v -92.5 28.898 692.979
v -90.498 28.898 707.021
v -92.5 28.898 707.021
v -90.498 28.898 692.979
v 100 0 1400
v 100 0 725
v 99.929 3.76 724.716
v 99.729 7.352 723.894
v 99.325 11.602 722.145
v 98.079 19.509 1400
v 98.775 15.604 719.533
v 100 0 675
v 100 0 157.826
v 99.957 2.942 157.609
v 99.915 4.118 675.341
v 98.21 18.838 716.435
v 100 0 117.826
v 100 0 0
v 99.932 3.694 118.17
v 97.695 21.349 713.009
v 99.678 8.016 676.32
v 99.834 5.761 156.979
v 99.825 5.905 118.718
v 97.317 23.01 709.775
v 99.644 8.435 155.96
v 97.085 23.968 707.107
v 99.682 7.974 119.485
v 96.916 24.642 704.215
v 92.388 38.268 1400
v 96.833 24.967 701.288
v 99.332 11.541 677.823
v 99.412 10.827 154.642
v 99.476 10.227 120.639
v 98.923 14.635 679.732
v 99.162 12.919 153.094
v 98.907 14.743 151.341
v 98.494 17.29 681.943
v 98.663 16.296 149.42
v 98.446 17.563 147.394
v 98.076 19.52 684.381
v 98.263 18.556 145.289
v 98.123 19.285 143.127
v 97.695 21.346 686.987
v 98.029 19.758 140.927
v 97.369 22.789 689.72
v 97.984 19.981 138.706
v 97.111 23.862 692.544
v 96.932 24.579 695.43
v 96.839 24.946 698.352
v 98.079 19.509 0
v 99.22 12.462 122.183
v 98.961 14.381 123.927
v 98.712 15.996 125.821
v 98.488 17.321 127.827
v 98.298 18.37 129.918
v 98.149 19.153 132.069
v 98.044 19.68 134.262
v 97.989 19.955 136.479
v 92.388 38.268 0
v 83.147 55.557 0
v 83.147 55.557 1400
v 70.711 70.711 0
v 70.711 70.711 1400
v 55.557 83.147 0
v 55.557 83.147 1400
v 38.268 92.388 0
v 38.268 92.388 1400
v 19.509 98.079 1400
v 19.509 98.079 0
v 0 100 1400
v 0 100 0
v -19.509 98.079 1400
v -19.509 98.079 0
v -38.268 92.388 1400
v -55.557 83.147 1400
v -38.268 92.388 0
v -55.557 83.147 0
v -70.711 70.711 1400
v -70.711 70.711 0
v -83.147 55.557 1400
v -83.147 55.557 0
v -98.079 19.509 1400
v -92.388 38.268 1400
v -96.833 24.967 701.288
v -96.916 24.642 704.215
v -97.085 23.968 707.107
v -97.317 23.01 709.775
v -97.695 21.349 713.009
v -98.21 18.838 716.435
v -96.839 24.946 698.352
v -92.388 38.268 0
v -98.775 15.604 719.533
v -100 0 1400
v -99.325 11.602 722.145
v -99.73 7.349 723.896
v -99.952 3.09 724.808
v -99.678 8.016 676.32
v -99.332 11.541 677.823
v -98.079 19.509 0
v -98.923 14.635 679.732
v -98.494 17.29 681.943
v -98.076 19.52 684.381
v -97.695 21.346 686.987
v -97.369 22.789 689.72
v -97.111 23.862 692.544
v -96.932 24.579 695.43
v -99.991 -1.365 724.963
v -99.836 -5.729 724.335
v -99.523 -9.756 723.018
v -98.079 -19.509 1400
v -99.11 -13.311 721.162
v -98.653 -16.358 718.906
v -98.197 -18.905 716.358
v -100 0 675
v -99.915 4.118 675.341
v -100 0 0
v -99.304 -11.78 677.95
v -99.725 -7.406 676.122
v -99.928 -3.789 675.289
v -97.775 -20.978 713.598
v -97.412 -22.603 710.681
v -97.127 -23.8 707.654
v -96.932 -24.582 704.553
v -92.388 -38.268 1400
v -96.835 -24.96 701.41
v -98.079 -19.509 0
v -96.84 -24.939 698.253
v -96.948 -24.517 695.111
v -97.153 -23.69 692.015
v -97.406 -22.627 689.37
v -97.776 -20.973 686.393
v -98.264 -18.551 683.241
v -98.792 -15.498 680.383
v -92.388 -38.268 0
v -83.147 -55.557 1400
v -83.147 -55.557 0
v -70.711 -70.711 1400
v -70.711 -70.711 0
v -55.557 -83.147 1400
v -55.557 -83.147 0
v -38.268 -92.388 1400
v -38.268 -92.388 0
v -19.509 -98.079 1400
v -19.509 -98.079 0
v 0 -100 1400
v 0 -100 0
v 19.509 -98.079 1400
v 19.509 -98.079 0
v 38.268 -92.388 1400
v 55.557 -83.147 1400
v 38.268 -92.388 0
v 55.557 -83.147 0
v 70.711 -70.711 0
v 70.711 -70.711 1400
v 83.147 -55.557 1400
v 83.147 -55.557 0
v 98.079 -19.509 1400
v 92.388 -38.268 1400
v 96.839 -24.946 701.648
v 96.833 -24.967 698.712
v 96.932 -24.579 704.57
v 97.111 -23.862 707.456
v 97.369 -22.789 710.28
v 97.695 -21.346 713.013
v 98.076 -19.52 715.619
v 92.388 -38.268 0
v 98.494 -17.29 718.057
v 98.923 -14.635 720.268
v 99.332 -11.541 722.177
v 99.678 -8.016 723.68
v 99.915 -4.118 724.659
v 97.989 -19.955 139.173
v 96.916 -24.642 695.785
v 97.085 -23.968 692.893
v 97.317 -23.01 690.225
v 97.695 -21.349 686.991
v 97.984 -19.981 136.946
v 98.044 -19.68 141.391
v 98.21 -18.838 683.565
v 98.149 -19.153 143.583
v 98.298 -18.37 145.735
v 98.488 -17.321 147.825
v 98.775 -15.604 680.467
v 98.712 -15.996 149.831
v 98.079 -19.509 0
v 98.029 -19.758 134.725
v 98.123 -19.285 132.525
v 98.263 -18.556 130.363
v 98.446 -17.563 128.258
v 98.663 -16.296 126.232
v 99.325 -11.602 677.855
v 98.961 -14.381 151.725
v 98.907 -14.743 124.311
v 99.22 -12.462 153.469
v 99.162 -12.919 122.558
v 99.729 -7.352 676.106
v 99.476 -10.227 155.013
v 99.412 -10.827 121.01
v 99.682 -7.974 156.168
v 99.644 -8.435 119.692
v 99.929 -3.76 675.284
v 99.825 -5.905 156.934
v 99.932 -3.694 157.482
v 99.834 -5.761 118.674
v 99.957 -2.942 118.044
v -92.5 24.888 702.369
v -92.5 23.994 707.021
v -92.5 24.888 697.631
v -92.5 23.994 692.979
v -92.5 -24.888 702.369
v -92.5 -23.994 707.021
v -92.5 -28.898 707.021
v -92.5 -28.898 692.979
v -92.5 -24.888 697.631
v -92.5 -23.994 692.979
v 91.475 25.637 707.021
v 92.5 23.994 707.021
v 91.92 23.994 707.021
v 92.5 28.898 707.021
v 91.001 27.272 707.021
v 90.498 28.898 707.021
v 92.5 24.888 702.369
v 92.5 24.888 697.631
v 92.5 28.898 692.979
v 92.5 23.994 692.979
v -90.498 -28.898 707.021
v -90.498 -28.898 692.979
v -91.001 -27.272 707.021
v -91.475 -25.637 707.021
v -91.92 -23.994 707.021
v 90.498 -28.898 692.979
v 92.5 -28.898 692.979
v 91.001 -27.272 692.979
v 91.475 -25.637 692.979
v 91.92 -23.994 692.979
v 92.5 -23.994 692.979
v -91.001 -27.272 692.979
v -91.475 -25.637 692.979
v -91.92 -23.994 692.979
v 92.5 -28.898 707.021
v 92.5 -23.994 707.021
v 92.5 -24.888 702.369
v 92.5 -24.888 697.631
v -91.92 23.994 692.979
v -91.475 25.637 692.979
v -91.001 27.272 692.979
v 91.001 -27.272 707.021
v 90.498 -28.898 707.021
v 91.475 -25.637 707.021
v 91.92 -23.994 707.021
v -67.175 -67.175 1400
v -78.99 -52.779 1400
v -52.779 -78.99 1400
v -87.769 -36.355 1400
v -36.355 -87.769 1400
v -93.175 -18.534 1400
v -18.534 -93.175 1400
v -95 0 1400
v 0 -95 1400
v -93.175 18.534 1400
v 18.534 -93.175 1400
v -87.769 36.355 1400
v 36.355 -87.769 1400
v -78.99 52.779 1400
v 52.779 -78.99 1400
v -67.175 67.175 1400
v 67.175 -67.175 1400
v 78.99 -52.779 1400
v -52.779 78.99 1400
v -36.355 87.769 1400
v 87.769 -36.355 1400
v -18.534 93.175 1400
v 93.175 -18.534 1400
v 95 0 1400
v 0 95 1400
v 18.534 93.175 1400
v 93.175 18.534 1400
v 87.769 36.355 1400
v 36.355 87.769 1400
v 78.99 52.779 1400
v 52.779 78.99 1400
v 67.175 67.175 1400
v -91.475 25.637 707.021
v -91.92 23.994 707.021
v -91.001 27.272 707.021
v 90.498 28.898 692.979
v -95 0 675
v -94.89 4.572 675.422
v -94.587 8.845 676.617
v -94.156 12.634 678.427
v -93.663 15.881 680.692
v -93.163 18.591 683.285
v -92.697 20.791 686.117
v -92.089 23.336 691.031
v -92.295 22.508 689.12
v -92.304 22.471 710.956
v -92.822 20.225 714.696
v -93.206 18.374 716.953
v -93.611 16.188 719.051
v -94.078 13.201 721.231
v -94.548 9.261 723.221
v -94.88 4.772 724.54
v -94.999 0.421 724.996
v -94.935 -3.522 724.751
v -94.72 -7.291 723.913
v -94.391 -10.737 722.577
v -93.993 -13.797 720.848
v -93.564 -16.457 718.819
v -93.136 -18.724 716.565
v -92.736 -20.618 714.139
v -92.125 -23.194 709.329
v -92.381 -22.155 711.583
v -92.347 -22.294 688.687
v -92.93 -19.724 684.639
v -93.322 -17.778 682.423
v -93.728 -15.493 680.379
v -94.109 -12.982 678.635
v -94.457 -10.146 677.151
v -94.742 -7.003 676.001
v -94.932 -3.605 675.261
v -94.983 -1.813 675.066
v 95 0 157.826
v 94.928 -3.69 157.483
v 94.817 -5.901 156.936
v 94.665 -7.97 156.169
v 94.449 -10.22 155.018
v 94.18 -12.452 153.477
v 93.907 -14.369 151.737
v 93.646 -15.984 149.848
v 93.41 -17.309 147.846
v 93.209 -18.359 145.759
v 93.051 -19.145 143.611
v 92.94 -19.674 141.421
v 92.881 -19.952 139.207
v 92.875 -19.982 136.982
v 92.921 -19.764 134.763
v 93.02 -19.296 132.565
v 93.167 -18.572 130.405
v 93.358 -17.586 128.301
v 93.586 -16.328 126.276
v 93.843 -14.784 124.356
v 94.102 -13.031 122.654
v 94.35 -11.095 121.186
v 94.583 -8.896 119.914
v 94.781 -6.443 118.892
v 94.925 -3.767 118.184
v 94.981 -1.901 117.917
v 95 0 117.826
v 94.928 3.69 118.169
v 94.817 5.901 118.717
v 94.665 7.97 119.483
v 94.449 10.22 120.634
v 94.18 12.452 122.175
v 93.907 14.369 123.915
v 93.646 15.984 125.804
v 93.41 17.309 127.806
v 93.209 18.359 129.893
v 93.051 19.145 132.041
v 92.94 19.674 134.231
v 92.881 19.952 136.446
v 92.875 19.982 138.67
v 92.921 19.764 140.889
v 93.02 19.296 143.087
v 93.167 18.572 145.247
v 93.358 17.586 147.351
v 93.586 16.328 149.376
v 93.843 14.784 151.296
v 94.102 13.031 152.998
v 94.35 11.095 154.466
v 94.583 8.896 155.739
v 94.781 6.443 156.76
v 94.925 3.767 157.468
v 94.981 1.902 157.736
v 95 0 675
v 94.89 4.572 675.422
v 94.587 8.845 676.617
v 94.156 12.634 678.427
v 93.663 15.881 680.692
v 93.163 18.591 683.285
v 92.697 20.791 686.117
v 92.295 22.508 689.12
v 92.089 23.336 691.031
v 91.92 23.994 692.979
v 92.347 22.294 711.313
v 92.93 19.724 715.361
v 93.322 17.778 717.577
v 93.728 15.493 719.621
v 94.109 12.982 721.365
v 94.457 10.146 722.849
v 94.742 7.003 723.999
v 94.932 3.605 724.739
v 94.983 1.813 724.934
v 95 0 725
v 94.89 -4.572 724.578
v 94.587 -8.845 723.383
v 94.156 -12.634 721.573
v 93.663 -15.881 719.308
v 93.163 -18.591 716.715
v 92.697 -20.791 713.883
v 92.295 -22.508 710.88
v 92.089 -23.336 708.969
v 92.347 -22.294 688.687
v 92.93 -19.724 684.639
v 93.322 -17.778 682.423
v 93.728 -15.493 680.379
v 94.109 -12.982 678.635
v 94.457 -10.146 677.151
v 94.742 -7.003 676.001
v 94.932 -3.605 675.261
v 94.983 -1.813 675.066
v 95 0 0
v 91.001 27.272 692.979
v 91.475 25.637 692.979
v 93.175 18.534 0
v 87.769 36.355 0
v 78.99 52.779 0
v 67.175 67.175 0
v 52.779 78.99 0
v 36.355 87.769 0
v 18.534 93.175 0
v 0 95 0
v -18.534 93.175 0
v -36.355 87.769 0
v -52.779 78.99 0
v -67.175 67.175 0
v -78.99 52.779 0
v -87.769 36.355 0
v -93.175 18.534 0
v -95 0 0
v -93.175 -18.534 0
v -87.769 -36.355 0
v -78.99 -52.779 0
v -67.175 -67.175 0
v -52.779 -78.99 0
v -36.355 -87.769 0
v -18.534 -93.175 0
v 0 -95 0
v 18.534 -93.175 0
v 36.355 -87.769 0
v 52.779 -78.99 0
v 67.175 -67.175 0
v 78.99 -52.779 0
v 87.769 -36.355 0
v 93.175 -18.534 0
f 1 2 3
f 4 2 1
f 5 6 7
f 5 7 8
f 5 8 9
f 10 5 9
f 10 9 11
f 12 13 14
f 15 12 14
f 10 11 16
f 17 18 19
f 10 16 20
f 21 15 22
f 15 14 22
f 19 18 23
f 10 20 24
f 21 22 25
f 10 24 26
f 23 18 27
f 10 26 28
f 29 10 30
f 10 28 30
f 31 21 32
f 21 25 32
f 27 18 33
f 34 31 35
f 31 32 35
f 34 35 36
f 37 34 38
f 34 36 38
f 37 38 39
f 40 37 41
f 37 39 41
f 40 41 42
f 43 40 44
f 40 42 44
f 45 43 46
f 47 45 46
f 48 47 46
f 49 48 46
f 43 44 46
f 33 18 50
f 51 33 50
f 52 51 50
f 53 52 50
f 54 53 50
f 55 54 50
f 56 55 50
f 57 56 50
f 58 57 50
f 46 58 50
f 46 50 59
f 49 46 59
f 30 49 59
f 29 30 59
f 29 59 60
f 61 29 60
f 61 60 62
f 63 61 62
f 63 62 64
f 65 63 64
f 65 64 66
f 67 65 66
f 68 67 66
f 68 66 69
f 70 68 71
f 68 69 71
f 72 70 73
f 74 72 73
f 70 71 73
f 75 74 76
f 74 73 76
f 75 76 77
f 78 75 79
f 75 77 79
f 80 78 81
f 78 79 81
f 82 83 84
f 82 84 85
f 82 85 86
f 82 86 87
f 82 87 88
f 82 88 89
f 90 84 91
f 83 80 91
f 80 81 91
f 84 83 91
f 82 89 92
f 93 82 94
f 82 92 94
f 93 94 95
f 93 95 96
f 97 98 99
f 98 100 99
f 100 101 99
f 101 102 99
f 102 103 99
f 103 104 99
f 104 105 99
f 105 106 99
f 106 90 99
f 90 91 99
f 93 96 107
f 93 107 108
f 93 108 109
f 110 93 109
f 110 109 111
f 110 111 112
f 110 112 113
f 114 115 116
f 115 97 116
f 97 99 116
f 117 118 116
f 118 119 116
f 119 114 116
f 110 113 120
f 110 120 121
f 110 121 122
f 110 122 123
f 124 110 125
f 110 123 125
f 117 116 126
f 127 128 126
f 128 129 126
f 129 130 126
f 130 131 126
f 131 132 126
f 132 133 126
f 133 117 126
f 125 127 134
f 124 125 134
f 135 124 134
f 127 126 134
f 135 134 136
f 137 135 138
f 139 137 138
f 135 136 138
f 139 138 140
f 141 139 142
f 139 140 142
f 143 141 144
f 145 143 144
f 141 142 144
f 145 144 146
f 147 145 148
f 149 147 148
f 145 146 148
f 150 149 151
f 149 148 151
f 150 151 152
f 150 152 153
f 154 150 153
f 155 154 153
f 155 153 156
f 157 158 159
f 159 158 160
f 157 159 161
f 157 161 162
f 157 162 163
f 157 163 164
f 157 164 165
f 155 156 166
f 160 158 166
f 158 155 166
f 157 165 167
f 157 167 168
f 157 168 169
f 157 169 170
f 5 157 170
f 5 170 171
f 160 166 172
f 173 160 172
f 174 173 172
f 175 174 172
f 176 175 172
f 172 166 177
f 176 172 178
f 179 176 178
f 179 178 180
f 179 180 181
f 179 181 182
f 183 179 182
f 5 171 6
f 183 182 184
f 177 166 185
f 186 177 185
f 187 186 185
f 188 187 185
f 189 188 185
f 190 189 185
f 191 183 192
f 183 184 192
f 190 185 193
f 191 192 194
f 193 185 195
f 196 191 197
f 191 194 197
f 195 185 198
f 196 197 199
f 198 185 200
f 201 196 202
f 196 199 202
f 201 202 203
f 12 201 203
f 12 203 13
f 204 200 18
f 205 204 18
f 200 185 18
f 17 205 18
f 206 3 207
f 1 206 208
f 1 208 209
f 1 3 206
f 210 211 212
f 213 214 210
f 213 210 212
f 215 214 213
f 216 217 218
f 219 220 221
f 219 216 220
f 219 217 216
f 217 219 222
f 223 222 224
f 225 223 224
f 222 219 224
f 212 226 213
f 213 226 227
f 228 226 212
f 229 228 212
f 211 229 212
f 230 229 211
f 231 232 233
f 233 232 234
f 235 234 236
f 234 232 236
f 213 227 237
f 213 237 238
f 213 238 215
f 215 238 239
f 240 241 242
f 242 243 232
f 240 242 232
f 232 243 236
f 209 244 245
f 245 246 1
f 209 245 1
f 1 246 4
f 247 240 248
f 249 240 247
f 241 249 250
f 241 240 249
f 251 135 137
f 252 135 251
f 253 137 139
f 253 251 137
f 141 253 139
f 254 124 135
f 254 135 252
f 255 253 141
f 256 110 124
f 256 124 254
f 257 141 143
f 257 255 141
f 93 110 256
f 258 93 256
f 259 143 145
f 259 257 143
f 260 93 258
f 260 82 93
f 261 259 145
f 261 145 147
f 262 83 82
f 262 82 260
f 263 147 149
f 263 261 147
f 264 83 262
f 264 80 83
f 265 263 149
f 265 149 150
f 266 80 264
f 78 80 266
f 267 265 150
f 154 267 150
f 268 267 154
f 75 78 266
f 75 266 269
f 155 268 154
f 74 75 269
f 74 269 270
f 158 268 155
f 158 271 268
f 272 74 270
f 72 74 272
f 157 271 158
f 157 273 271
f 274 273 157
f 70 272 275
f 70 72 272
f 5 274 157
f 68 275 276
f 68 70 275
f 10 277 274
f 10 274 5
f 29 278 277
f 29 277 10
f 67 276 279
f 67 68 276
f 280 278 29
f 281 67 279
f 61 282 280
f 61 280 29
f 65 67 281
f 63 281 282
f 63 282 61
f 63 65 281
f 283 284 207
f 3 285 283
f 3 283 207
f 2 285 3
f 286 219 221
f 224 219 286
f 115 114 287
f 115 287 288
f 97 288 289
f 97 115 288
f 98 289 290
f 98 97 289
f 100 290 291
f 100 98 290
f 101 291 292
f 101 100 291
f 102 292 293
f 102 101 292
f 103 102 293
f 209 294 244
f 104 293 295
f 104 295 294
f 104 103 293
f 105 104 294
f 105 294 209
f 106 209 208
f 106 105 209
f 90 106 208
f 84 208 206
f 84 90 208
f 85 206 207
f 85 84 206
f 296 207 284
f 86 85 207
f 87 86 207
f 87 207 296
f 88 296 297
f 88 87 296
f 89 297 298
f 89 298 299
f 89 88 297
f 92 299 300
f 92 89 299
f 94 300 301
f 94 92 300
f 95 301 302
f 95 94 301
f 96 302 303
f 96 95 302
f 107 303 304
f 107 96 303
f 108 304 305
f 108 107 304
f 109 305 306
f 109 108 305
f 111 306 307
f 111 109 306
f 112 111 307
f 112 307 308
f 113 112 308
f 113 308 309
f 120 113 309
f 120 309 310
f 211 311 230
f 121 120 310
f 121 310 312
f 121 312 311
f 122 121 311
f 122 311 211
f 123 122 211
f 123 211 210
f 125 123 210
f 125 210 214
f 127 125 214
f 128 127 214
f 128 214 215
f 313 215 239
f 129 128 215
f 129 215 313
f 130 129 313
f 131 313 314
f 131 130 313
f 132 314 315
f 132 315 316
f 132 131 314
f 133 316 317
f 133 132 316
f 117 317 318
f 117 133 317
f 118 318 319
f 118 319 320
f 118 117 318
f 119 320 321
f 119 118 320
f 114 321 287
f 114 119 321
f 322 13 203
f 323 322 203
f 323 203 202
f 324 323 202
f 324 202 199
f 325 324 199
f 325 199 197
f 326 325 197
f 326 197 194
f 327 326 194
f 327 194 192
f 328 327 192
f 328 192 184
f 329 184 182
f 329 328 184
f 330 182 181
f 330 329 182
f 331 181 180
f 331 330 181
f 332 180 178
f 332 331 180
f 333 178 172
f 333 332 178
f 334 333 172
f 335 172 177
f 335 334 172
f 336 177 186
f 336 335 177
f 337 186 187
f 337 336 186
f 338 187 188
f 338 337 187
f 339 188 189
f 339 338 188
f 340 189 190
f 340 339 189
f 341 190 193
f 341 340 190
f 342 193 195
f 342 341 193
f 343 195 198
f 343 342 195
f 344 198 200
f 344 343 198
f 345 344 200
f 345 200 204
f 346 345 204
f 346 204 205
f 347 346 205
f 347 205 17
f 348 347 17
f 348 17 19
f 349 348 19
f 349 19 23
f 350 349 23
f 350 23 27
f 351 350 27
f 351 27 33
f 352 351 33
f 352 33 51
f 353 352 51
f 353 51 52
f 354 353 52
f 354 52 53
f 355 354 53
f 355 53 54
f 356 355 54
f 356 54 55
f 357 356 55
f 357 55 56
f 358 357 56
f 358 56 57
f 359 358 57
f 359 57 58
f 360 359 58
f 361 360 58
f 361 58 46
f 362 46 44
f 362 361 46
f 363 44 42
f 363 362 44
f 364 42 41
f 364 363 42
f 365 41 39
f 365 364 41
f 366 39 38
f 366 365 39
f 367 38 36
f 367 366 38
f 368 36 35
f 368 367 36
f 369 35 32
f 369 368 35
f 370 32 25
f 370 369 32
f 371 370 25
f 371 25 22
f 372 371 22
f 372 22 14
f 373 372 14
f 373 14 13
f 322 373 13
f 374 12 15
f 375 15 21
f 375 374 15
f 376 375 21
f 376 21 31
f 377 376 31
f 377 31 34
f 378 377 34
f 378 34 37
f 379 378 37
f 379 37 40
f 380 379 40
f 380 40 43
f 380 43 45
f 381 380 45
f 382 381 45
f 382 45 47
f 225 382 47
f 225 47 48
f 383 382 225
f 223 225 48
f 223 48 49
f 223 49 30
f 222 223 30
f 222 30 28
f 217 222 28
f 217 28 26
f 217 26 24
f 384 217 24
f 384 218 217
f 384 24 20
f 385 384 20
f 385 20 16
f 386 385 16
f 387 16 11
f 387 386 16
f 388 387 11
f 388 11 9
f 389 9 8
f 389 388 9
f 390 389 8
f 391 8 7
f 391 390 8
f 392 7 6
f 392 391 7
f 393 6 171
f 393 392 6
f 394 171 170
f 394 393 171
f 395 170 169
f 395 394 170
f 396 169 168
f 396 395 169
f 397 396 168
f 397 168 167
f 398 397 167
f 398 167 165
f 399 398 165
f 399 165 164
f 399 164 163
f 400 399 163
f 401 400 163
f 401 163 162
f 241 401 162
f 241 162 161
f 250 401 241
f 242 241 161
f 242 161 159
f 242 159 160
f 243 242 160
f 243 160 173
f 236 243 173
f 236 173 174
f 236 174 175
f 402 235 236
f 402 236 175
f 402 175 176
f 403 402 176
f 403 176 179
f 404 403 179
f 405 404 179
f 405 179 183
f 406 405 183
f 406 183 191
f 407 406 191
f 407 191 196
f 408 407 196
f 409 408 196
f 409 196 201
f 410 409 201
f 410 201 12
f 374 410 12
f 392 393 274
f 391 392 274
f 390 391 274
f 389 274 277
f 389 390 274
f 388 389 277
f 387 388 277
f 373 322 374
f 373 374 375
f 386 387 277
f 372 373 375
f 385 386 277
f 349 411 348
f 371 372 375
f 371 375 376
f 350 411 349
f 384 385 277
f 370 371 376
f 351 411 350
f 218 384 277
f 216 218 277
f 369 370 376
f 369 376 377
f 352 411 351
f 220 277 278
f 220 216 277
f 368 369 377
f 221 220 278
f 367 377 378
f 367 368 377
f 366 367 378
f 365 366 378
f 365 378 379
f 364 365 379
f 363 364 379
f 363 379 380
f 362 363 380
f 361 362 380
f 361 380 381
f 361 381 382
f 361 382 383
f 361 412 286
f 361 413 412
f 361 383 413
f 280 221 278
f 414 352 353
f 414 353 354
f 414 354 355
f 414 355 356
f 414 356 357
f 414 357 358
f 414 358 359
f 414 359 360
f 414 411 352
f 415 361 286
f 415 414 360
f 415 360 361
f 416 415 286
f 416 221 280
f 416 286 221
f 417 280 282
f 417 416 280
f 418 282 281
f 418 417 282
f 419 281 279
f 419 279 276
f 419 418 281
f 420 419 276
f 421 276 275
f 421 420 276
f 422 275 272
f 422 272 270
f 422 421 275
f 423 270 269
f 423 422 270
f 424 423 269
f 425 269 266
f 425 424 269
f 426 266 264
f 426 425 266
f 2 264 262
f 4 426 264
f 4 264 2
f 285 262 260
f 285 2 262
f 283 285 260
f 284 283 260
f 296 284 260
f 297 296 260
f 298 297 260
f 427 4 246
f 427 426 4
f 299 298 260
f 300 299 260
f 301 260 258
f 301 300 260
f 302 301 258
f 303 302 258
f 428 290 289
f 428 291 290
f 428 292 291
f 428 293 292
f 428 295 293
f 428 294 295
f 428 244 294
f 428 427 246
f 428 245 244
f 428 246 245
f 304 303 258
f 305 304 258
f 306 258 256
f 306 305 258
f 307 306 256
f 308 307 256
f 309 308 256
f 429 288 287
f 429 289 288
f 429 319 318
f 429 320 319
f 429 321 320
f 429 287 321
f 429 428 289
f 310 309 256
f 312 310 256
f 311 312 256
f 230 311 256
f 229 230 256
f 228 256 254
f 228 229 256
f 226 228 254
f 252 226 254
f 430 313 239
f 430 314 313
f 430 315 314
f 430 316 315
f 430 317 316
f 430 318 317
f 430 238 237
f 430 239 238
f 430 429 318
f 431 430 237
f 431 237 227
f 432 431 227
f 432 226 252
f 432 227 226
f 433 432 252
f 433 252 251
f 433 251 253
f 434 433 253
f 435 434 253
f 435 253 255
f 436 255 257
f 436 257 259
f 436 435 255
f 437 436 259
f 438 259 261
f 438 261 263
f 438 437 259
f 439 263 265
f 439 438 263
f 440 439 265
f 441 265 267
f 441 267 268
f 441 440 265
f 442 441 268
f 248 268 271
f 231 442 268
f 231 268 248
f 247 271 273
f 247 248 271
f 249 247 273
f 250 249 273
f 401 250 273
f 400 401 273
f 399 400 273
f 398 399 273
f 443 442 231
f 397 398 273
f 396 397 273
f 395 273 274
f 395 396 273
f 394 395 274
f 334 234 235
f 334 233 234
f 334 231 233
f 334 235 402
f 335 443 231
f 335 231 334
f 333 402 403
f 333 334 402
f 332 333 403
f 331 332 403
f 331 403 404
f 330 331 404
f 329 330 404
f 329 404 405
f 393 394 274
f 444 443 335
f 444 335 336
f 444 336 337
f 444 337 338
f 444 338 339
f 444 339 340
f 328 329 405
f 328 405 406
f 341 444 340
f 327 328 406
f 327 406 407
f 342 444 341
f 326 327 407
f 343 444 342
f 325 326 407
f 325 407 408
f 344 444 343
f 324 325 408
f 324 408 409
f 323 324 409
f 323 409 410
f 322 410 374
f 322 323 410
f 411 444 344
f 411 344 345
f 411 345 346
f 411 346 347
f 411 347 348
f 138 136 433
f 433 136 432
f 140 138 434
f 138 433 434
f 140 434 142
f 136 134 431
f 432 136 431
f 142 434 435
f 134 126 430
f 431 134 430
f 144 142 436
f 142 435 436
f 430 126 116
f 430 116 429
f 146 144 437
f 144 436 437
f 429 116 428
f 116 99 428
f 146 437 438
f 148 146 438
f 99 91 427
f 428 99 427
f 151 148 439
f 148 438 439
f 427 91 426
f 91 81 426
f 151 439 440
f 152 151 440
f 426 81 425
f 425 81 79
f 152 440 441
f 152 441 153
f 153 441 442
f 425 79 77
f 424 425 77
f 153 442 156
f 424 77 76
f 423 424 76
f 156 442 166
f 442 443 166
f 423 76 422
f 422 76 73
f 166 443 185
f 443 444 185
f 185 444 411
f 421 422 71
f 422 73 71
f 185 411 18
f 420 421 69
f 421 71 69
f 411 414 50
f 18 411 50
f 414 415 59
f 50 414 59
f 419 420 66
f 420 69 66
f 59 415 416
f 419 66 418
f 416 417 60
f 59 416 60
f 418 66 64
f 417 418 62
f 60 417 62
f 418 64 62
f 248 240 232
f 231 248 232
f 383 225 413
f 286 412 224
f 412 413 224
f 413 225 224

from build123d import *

# Parameters (mm, degrees)
ESBO_O2_R                  = 100
ESBO_O2_R_2                = 95
RESSALTO_EXTRUS_O2_DEPTH   = 1400
CORTE_EXTRUS_O1_DEPTH      = 1408.124727947
CORTE_EXTRUS_O1_DEPTH_BACK = 1408.124727947
ESBO_O3_R                  = 25
ESBO_O4_W                  = 14.042229064
ESBO_O4_H                  = 57.796016078
CORTE_EXTRUS_O2_DEPTH      = 92.5
ESBO_O5_R                  = 20
CORTE_EXTRUS_O3_DEPTH      = 185


with BuildPart() as part:
    # Esboço2 → Ressalto-extrusão2 (new body)
    with BuildSketch(Plane.XY):
        Circle(ESBO_O2_R)
        Circle(ESBO_O2_R_2, mode=Mode.SUBTRACT)
    extrude(amount=RESSALTO_EXTRUS_O2_DEPTH)

    # Esboço3 → Corte-extrusão1 (cut, two sides: drawn at the far end of the back side and taken through both)
    with BuildSketch(Plane(origin=(0, 0, 0), x_dir=(0, 0, -1), z_dir=(1, 0, 0)).offset(-CORTE_EXTRUS_O1_DEPTH_BACK)):
        with Locations((-700, 0)):
            Circle(ESBO_O3_R)
    extrude(amount=CORTE_EXTRUS_O1_DEPTH + CORTE_EXTRUS_O1_DEPTH_BACK, mode=Mode.SUBTRACT)

    # Esboço4 → Corte-extrusão2 (cut, symmetric)
    with BuildSketch(Plane(origin=(0, 0, 0), x_dir=(0, 0, -1), z_dir=(1, 0, 0))):
        with Locations((-700, 0)):
            Rectangle(ESBO_O4_W, ESBO_O4_H)
    extrude(amount=CORTE_EXTRUS_O2_DEPTH, both=True, mode=Mode.SUBTRACT)

    # Esboço5 → Corte-extrusão3 (cut)
    with BuildSketch(Plane(origin=(0, 0, 0), x_dir=(0, 0, -1), z_dir=(1, 0, 0))):
        with Locations(Location((-137.826137531, 0, 0), (0, 0, 180))):
            Circle(ESBO_O5_R)
    extrude(amount=CORTE_EXTRUS_O3_DEPTH, mode=Mode.SUBTRACT)


solid = part.part
